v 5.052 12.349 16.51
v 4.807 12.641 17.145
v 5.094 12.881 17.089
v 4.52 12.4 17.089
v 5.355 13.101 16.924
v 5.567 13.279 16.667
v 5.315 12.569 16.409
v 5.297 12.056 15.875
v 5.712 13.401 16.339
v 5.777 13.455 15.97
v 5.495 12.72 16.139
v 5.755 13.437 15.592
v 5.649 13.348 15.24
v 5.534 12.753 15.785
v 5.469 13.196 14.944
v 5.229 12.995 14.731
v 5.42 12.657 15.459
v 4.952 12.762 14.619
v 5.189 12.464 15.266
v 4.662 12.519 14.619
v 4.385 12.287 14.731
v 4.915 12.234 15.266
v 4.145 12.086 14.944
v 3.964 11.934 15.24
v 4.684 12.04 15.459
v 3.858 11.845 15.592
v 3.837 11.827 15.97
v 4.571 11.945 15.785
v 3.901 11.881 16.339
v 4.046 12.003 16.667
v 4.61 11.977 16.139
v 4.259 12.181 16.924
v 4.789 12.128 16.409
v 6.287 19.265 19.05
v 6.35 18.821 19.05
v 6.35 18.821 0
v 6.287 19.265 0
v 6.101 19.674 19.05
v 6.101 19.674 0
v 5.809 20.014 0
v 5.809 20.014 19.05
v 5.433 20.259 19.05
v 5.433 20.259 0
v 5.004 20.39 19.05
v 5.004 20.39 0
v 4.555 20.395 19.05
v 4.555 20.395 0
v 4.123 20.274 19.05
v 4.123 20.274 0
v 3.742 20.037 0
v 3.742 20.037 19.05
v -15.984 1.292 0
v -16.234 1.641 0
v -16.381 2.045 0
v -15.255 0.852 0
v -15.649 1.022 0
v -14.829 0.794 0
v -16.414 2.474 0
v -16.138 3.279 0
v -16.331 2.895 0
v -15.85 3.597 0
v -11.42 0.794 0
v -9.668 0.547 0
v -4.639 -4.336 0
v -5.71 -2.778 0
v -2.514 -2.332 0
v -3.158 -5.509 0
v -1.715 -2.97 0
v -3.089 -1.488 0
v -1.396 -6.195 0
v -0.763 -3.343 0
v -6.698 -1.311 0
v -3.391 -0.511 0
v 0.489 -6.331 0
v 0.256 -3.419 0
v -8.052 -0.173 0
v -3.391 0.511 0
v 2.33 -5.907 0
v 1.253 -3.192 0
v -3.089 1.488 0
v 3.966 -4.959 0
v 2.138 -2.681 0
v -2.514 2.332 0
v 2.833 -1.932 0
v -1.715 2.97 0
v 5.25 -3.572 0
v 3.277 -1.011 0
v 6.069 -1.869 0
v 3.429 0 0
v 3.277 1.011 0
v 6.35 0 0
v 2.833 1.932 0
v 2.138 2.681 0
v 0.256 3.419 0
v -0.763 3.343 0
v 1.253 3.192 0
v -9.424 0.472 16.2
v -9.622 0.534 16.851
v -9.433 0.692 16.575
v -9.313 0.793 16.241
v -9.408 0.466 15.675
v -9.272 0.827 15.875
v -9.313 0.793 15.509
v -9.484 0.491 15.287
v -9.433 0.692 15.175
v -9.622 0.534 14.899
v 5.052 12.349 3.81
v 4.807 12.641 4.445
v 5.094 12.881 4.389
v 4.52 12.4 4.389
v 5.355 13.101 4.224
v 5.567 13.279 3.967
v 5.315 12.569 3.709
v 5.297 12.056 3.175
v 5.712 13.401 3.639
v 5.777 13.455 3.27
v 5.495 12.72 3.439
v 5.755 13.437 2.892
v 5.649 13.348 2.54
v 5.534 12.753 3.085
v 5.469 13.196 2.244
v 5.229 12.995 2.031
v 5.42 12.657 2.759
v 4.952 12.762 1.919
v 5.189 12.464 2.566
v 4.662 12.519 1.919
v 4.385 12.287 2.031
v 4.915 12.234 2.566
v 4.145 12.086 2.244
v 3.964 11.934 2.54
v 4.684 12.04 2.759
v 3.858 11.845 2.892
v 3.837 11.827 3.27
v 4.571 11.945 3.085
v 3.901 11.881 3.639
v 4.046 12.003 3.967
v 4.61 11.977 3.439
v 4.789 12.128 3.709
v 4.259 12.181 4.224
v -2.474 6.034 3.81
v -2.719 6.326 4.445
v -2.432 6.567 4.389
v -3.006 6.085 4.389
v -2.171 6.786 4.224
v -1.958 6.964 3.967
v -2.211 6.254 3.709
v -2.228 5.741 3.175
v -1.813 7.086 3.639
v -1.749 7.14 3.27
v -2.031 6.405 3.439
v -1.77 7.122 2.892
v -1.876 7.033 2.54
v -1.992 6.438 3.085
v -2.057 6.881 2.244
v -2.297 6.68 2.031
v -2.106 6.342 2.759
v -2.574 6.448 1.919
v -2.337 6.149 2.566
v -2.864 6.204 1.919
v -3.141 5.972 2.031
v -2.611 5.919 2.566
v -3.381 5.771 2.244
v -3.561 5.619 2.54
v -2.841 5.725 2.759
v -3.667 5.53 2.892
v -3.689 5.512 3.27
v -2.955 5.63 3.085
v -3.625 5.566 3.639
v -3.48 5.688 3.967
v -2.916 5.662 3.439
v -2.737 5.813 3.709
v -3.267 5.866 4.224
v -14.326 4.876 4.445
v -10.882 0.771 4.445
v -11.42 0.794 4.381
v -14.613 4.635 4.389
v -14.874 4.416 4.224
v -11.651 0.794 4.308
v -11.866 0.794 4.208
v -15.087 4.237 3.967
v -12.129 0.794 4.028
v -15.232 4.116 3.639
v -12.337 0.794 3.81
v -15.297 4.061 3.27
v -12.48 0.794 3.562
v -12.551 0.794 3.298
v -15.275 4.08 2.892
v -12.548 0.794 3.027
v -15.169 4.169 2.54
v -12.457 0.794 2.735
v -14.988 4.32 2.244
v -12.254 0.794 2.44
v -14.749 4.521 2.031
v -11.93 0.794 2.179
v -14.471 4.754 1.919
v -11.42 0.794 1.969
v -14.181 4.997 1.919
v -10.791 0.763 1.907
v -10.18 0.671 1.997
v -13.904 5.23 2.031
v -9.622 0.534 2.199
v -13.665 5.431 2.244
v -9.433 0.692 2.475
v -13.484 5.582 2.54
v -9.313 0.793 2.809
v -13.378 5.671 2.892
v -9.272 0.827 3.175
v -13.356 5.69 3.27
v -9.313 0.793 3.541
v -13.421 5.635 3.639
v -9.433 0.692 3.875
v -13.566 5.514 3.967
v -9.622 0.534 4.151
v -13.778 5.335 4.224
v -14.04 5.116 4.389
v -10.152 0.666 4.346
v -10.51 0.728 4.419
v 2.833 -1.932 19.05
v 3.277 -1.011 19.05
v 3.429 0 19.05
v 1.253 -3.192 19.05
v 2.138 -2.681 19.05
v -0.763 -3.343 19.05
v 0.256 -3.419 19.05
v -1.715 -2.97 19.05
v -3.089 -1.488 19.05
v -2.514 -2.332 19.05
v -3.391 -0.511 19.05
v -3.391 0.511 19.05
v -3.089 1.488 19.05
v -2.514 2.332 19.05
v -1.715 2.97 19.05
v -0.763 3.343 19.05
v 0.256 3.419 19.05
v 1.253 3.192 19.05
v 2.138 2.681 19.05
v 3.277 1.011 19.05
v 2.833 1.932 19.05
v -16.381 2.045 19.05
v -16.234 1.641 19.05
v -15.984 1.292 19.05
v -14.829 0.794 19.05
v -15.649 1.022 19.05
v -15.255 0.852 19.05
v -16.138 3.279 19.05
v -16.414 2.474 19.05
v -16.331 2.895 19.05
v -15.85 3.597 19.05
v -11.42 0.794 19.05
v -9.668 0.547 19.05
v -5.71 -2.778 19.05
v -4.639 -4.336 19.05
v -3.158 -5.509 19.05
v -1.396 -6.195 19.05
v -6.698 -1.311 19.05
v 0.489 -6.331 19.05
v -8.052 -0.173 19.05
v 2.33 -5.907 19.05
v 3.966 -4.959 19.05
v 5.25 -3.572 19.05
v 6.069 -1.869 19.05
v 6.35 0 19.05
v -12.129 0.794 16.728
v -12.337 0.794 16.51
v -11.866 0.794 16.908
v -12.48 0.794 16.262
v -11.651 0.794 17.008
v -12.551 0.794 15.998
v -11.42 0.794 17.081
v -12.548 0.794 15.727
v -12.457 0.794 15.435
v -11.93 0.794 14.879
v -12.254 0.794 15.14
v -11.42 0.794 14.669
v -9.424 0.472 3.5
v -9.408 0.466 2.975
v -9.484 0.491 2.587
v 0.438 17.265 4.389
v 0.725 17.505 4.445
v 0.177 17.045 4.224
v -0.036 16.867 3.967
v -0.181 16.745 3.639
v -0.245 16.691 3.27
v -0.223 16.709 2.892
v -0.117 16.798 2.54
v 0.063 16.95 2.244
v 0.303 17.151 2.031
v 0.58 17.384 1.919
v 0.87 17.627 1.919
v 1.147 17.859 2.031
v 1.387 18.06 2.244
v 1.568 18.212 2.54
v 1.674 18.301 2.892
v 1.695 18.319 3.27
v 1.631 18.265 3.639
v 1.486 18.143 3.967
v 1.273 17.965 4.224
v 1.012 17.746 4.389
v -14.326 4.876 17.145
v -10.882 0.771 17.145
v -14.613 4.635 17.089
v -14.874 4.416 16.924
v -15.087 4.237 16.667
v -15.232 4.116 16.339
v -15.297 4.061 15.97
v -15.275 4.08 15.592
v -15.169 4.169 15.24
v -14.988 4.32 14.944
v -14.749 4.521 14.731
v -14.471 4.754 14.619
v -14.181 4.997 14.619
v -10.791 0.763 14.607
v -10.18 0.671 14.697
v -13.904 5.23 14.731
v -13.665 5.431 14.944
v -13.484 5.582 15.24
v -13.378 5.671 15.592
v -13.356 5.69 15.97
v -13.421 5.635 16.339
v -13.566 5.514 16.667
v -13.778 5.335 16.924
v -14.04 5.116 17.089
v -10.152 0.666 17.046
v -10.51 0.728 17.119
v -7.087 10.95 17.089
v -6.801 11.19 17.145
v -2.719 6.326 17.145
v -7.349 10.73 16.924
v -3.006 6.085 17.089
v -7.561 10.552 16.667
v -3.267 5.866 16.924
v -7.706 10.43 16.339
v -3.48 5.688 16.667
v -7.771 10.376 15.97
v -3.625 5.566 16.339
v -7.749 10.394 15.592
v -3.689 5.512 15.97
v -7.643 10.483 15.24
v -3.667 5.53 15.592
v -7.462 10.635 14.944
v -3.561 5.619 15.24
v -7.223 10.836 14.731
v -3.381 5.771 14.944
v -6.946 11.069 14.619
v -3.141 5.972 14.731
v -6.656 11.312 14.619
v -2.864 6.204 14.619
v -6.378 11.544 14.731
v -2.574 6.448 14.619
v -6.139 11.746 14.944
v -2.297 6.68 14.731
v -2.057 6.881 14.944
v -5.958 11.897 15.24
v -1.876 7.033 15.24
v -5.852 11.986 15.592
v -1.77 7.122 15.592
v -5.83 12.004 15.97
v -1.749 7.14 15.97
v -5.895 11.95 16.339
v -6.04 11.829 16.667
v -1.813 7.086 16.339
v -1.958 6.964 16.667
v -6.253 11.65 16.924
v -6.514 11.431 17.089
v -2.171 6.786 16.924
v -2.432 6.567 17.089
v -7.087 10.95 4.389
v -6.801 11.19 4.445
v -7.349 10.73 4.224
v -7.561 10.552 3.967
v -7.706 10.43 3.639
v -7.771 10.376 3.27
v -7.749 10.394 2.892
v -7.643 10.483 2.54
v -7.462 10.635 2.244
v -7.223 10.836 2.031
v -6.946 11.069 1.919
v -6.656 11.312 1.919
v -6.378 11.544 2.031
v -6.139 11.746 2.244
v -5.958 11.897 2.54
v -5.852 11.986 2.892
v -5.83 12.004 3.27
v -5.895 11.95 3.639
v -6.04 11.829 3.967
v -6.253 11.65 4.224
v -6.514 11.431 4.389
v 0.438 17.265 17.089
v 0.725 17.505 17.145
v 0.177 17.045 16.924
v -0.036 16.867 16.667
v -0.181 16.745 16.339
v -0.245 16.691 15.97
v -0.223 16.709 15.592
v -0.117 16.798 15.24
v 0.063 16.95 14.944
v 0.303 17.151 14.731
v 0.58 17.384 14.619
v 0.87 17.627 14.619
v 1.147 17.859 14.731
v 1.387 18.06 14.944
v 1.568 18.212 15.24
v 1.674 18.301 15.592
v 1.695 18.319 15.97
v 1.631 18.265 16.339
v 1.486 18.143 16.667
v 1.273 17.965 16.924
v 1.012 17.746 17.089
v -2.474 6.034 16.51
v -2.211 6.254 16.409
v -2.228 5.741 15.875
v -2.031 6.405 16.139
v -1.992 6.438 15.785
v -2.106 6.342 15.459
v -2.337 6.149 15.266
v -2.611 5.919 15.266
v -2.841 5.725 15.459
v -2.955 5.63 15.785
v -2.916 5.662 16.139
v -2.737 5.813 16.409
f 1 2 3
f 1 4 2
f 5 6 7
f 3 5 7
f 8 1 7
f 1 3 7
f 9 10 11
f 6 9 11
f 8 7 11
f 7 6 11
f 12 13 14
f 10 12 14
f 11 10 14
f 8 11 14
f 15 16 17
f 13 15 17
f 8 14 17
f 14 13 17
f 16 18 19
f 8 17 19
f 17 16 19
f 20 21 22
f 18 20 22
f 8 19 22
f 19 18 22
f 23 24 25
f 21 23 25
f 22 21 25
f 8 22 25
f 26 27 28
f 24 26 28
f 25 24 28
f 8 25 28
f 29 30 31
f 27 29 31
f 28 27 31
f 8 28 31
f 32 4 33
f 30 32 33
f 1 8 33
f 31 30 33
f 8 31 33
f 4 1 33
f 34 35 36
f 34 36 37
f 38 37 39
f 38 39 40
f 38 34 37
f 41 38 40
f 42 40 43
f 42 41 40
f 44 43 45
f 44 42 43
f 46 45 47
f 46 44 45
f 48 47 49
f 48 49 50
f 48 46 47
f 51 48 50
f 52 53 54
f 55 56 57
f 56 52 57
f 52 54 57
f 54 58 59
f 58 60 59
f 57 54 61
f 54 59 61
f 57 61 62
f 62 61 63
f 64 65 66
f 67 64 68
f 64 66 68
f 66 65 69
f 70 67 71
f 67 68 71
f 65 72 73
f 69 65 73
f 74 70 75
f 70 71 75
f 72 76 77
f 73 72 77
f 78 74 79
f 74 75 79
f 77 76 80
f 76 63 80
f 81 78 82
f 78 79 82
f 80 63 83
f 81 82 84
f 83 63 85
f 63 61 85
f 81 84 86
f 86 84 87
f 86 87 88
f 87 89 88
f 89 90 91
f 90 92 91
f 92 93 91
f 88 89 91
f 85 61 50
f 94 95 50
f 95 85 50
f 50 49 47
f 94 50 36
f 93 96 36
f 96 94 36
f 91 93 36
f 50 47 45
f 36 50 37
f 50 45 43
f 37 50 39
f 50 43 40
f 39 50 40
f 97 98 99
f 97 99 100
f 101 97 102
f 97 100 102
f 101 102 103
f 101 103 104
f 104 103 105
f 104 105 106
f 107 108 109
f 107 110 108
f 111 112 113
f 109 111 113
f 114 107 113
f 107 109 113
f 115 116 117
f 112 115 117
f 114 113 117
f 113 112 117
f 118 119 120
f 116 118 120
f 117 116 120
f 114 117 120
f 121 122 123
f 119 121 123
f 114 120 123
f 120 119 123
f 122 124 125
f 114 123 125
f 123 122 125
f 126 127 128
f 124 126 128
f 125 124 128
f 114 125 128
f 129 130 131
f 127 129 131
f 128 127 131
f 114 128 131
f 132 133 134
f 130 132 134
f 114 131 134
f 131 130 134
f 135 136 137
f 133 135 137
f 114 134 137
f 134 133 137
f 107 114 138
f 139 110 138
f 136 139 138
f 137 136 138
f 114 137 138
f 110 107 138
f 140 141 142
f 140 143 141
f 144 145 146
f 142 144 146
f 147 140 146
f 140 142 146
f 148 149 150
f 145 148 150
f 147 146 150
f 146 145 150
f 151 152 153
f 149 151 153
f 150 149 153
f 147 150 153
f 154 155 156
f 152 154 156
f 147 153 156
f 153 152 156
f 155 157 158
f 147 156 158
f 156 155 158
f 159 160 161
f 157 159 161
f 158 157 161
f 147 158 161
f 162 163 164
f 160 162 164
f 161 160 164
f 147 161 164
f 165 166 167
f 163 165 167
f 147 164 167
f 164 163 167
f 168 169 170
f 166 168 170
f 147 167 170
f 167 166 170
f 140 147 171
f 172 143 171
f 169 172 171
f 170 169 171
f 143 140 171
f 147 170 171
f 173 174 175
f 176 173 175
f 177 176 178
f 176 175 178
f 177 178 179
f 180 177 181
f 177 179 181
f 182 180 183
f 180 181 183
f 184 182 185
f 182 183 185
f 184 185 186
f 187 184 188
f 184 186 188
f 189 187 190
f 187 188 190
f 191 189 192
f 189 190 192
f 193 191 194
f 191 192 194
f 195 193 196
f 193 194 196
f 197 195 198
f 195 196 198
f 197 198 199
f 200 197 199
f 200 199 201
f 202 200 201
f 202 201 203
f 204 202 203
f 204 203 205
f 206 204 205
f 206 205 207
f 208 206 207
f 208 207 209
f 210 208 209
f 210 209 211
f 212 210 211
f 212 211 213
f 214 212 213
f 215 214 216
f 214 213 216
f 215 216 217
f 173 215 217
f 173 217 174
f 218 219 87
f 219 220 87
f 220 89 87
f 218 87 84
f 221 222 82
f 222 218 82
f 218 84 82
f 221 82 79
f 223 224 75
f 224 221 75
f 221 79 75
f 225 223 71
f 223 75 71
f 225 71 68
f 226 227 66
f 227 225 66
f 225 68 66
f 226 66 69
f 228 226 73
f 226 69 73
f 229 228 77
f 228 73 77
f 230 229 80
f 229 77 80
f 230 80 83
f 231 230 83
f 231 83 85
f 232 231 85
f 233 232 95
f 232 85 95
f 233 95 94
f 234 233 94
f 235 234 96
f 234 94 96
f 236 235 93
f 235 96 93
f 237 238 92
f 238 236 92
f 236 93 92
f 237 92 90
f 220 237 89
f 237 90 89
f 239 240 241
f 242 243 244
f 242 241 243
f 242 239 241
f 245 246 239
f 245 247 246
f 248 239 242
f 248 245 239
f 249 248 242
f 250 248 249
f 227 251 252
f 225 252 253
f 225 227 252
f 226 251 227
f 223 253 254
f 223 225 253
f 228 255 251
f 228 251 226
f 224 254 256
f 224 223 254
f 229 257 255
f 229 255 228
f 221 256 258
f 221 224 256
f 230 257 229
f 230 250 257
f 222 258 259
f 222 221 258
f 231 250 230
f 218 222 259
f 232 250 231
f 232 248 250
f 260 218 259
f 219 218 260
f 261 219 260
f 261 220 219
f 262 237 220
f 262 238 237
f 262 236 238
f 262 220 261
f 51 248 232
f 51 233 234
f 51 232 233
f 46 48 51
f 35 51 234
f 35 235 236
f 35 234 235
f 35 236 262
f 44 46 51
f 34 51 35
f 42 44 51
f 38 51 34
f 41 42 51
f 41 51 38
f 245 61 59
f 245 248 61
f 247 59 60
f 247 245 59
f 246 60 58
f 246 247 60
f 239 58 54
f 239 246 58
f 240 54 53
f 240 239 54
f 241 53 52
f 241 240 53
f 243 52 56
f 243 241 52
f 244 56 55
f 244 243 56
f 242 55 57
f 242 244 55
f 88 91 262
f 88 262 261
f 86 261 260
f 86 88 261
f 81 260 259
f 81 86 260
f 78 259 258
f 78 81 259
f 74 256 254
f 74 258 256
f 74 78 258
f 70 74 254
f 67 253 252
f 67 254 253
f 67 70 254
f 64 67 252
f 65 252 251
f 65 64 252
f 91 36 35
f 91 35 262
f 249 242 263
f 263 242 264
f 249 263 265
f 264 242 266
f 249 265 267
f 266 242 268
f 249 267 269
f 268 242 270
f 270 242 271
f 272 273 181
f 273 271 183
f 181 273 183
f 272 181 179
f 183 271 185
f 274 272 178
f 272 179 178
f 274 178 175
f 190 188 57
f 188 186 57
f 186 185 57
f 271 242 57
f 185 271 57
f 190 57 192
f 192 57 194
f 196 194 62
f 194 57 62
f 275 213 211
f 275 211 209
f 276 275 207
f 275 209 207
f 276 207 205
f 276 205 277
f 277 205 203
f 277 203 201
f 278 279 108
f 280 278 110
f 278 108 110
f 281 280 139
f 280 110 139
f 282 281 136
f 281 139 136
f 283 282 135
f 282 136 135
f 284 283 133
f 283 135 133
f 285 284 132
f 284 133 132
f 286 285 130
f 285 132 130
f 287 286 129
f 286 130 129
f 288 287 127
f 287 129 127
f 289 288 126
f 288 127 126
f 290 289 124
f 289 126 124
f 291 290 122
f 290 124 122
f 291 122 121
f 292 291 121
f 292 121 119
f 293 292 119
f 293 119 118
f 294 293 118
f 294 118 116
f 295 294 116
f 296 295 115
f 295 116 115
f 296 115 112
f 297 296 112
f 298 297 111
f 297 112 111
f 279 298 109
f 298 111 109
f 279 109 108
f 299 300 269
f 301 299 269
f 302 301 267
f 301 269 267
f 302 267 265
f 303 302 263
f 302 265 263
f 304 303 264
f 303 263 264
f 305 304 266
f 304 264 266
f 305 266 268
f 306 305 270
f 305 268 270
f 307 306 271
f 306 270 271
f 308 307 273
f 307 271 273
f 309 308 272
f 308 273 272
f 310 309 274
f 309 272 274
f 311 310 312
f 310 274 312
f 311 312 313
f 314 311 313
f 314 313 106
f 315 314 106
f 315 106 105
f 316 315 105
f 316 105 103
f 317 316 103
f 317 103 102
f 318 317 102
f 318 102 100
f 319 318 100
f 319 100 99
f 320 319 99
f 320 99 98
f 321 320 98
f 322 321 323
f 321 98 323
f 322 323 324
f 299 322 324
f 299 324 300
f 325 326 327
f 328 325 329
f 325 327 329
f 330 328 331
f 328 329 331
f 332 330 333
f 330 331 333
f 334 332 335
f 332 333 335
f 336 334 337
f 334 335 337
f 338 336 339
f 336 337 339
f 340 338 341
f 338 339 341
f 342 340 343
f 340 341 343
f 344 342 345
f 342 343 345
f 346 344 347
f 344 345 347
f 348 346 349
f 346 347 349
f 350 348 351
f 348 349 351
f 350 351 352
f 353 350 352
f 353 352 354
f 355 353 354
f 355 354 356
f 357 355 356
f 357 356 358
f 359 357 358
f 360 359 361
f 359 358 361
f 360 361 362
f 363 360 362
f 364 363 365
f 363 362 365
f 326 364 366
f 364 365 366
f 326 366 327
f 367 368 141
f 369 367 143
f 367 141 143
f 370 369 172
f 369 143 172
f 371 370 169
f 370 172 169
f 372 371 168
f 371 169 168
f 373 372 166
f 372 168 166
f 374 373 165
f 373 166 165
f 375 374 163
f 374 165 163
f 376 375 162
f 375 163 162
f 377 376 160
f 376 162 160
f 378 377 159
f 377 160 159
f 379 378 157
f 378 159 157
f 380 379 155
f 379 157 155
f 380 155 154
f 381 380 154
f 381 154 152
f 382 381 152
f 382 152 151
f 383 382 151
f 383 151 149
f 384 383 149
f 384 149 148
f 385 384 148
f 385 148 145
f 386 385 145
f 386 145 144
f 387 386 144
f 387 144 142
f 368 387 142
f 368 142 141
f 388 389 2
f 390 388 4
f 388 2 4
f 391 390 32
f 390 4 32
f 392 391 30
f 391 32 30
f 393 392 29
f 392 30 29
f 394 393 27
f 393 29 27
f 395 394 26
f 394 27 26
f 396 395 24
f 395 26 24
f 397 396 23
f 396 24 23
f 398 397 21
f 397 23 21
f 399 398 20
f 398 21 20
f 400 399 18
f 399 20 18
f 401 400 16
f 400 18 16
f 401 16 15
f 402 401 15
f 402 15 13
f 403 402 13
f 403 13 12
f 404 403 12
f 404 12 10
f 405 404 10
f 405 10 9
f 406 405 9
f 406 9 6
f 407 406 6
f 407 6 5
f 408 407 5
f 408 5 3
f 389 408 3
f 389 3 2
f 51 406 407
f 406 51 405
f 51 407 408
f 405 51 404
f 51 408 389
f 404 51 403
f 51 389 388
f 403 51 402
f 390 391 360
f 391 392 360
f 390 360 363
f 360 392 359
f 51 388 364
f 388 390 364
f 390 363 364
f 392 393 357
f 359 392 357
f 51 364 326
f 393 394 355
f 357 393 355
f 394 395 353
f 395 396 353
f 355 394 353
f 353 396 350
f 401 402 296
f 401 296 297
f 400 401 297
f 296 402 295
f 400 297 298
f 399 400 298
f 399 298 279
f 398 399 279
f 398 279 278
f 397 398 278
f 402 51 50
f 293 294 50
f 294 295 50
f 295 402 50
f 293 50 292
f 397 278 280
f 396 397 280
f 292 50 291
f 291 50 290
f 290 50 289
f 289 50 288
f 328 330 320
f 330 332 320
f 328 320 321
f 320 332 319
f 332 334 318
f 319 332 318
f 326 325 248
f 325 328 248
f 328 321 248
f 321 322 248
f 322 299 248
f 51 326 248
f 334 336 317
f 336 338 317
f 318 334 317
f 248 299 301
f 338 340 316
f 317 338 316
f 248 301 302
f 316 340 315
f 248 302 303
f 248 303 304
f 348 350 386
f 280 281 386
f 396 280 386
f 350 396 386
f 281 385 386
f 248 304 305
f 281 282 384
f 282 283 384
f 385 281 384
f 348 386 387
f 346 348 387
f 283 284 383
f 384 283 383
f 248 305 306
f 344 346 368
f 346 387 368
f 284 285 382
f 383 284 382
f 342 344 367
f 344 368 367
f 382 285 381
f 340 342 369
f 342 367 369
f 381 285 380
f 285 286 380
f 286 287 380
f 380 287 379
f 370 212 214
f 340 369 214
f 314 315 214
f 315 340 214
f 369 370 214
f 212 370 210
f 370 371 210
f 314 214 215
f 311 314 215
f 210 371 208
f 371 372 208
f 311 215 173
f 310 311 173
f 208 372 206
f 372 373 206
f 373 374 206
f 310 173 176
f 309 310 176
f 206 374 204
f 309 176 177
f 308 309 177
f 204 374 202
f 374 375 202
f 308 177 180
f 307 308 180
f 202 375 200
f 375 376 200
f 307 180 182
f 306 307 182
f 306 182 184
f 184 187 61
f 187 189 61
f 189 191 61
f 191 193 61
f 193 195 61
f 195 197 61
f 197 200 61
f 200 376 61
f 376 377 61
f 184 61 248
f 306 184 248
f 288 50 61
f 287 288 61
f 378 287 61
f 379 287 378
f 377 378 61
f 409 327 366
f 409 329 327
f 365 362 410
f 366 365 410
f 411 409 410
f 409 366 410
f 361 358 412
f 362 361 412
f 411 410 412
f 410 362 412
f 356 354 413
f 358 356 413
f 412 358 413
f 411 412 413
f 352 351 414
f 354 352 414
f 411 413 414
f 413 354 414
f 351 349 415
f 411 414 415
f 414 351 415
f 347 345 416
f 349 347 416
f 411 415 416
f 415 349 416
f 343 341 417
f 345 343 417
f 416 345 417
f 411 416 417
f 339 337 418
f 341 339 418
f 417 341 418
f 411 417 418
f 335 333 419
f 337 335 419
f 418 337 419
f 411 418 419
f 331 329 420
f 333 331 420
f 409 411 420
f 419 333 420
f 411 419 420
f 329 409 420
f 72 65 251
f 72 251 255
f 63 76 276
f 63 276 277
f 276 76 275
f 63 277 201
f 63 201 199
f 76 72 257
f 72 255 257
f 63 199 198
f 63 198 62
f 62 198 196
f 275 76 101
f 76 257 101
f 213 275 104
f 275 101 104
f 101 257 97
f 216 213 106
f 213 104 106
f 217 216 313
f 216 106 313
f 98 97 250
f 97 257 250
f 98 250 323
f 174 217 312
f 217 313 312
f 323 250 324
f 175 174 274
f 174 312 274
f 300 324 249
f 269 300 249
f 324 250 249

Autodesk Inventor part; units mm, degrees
ref_plane "YZ Plane" through (0, 0, 0) normal (1, 0, 0) x (0, 1, 0)
ref_plane "XZ Plane" through (0, 0, 0) normal (0, 1, 0) x (-1, 0, 0)
ref_plane "XY Plane" through (0, 0, 0) normal (0, 0, 1) x (1, 0, 0)
sketch "Sketch3" plane through (0, 0, 0) normal (0, 0, 1) x (1, 0, 0)
  circle A0 centre (0, 0) radius 3.429
  circle A1 centre (0, 0) radius 6.35
  line L0 (6.35, 22.225) -> (-19.1908, 0.7937)
  line L1 (-19.1908, 0.7937) -> (-6.3002, 0.7937)
  line L2 (6.35, 22.225) -> (6.35, 0)
  dimension "d23" = 6.858
  dimension "d24" = 12.7
  dimension "d27" = 0.7937
  dimension "d28" = 6.35
  dimension "d29" = 50
  dimension "d30" = 22.225
extrude "Extrusion3" add sketch "Sketch3" along normal blind 19.05
fillet "Fillet2" radius 6.35 1 edges at (-6.3002, 0.7938, 9.525)
sketch "Sketch4" plane through (-19.1908, 0.7938, 19.05) normal (-0.6427876, 0.7660444, 0) x (0.7660444, 0.6427876, 0)
  line L0 (33.3411, 0) -> (0, 0) projected
  line L1 (6.35, 0) -> (6.35, 18.8766) construction
  line L2 (0, 19.05) -> (0, 0) projected
  line L3 (0, 9.525) -> (33.3411, 9.525) construction
  line L4 (33.3411, 19.05) -> (33.3411, 0) projected
  point P0 (14.1908, 19.05)
  point P1 (6.35, 3.175)
  point P2 (6.35, 15.875)
  point P3 (16.1742, 15.875)
  point P4 (16.1742, 3.175)
  point P5 (25.9983, 15.875)
  point P6 (25.9983, 3.175)
  dimension "d33" = 6.35
  dimension "d34" = 3.175
  dimension "d45" = 9.8242
hole "Hole1" at (-14.3264, 4.8755, 15.875) at (-14.3264, 4.8755, 3.175) at (-6.8006, 11.1903, 15.875) at (-6.8006, 11.1903, 3.175) at (0.7251, 17.5052, 3.175) at (0.7251, 17.5052, 15.875) direction (0.6427876, -0.7660444, 0) diameter 2.54 depth 6.35 tip angle 118
fillet "Fillet4" radius 1.5875 2 edges at (-19.1908, 0.7937, 9.525) (6.35, 22.225, 9.525)
properties part number "Wedge Mount" material "UHMW, White"
